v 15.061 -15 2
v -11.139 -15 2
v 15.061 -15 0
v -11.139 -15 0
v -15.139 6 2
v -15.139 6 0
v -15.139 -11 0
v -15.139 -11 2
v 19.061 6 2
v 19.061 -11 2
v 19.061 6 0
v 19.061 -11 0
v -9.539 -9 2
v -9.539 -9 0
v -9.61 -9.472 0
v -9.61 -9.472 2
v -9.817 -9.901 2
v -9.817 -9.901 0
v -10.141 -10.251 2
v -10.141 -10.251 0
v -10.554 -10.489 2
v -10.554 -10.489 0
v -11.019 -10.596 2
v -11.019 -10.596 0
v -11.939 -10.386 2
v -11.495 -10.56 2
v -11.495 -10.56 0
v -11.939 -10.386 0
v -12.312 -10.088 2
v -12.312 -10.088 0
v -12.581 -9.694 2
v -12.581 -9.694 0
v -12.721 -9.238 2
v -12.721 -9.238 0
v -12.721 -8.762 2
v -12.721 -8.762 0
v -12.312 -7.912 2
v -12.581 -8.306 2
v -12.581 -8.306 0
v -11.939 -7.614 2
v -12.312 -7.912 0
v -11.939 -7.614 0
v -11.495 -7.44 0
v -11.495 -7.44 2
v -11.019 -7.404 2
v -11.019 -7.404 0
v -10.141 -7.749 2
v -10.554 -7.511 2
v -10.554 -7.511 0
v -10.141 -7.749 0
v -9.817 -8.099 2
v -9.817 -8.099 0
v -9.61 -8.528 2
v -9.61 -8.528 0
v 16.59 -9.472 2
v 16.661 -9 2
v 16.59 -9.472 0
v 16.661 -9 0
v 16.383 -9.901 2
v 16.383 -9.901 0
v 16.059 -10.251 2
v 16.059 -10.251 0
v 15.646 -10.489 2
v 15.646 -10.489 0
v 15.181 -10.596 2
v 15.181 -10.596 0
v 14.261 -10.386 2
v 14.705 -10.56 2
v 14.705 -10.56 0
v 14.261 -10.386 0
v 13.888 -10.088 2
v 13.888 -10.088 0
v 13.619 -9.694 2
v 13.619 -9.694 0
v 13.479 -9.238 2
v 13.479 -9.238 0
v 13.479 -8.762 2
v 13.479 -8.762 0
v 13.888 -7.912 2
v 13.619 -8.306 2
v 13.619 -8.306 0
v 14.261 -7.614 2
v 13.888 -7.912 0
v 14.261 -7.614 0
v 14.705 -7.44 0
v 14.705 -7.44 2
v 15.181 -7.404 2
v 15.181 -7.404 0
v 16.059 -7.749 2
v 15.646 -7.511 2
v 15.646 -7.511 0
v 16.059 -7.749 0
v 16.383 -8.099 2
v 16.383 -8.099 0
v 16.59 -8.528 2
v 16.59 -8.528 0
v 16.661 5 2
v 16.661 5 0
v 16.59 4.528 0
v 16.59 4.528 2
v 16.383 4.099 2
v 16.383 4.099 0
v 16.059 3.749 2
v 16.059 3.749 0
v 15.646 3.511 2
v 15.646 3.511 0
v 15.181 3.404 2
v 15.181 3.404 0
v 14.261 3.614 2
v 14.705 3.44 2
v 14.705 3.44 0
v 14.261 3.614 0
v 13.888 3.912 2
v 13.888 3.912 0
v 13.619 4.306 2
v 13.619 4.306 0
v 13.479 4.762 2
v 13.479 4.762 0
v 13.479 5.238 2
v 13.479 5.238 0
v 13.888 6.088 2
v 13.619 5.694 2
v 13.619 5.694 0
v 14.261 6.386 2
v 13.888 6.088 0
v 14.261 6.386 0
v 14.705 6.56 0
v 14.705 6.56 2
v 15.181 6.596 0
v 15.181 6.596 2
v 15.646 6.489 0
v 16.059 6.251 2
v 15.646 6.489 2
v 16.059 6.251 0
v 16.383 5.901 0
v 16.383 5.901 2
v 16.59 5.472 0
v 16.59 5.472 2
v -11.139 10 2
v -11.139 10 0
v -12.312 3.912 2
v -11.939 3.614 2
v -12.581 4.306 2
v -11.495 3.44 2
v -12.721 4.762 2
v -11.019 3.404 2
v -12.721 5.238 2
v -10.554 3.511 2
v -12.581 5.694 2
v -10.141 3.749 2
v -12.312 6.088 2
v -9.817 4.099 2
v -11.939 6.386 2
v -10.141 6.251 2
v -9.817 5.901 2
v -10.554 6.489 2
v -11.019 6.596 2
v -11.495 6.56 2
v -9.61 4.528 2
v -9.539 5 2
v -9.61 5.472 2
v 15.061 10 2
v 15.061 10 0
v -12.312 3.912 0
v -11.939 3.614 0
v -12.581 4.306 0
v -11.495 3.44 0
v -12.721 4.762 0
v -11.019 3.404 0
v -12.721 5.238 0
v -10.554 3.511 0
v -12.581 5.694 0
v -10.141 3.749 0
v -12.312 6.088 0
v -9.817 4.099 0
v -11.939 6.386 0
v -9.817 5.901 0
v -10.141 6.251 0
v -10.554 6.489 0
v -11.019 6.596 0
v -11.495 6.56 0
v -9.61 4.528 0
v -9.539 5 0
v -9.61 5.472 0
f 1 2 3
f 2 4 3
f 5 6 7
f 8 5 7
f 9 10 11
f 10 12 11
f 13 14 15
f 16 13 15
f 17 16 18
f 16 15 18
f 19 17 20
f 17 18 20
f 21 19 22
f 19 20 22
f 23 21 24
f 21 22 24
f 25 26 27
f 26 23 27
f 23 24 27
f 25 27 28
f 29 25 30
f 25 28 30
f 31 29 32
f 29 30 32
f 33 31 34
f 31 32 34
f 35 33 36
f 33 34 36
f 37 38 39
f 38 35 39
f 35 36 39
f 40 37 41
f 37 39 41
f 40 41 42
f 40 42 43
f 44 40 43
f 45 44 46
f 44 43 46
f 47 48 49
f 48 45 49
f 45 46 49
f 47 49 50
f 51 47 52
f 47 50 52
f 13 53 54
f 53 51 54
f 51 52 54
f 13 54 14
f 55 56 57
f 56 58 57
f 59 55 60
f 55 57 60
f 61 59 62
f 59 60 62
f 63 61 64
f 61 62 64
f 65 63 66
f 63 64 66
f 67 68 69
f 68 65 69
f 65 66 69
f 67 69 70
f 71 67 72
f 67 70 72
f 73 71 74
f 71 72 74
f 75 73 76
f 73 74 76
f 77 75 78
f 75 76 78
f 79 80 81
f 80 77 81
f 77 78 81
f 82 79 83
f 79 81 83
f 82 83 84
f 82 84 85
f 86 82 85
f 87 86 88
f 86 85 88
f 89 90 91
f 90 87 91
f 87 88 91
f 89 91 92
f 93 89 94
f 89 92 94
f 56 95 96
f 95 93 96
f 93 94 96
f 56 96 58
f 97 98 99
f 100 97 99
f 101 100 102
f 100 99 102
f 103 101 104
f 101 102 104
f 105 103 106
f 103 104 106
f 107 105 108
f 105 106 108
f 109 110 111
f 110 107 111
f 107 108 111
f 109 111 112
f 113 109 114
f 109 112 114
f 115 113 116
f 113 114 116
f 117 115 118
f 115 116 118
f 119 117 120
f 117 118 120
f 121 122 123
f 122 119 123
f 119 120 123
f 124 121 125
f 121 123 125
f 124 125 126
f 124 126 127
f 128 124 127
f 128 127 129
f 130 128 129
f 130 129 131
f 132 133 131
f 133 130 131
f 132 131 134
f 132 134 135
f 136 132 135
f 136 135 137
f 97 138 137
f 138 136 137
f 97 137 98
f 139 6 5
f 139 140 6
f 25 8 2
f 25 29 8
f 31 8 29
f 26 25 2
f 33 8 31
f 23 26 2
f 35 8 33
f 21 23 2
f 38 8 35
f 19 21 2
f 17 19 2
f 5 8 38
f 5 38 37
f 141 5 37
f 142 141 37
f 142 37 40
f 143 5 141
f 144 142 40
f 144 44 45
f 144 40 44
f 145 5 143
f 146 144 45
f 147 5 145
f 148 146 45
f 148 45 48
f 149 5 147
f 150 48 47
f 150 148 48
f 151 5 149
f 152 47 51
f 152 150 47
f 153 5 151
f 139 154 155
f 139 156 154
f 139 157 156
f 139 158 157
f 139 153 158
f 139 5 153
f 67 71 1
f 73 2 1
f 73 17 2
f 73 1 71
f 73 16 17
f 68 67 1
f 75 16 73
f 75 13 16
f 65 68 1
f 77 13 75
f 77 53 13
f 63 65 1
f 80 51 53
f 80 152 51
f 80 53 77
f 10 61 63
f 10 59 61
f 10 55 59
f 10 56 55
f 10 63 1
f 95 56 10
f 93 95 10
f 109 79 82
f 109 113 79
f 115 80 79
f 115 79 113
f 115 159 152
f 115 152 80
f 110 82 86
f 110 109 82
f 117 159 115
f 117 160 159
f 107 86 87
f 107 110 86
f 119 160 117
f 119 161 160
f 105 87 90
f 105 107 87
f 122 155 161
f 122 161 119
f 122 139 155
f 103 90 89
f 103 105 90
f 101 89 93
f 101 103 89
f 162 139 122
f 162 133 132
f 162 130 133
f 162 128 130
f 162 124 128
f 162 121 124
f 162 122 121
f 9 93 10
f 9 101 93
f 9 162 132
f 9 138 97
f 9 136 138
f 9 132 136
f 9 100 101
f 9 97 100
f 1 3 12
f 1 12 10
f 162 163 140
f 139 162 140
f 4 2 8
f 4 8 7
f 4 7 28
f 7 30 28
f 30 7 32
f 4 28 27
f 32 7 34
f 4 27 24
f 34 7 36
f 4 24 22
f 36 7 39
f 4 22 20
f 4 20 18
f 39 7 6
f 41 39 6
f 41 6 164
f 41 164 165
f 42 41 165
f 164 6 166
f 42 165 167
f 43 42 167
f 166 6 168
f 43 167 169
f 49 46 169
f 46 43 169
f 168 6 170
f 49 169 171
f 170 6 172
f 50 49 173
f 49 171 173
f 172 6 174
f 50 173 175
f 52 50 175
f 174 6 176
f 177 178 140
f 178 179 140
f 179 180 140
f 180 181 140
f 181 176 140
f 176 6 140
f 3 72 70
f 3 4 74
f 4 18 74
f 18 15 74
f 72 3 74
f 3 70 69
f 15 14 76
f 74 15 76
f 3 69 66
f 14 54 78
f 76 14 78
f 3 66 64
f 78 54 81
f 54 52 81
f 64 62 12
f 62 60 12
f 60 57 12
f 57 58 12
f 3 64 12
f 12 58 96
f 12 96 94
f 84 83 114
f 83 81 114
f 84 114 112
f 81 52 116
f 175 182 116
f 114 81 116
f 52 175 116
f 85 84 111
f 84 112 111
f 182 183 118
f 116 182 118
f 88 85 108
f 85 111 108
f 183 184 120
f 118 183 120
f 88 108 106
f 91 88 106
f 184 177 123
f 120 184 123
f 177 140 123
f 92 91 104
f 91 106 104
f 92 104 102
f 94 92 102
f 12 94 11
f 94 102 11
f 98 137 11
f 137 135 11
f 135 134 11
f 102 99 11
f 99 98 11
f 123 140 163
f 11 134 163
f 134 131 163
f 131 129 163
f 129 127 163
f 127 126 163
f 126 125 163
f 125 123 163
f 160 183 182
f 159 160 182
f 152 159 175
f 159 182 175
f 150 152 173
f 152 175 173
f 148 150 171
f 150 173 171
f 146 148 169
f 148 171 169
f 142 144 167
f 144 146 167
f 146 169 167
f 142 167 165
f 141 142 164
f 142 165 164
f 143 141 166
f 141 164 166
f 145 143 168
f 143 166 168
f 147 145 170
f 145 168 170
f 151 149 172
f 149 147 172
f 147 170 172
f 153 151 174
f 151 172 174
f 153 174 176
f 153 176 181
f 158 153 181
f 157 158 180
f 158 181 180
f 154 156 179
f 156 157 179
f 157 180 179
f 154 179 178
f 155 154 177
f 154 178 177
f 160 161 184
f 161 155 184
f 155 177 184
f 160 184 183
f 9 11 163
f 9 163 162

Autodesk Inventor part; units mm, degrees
ref_plane "YZ Plane" through (0, 0, 0) normal (1, 0, 0) x (0, 1, 0)
ref_plane "XZ Plane" through (0, 0, 0) normal (0, 1, 0) x (-1, 0, 0)
ref_plane "XY Plane" through (0, 0, 0) normal (0, 0, 1) x (1, 0, 0)
sketch "Эскиз1" plane through (0, 0, 0) normal (0, 0, 1) x (1, 0, 0)
  line L0 (-15.139, -15) -> (19.061, -15)
  line L1 (19.061, -15) -> (19.061, 10)
  line L2 (19.061, 10) -> (-15.139, 10)
  line L3 (-15.139, 10) -> (-15.139, -15)
  circle A0 centre (-11.139, 5) radius 1.6
  circle A1 centre (-11.139, -9) radius 1.6
  circle A2 centre (15.061, 5) radius 1.6
  circle A3 centre (15.061, -9) radius 1.6
  point P0 (0, 0)
  dimension "d0" = 34.2
  dimension "d5" = 3.2
  dimension "d7" = 14
  dimension "d16" = 3.2
  dimension "d17" = 3.2
  dimension "d18" = 3.2
  dimension "d19" = 5
  dimension "d20" = 14
  dimension "d21" = 6
  dimension "d22" = 6
  dimension "d23" = 4
  dimension "d24" = 4
extrude "Выдавливание1" add sketch "Эскиз1" along normal blind 2
chamfer "Фаска1" distance 4 angle 45 4 edges at (19.061, 10, 1) (-15.139, 10, 1) (19.061, -15, 1) (-15.139, -15, 1)
properties part number "стена_простая"
